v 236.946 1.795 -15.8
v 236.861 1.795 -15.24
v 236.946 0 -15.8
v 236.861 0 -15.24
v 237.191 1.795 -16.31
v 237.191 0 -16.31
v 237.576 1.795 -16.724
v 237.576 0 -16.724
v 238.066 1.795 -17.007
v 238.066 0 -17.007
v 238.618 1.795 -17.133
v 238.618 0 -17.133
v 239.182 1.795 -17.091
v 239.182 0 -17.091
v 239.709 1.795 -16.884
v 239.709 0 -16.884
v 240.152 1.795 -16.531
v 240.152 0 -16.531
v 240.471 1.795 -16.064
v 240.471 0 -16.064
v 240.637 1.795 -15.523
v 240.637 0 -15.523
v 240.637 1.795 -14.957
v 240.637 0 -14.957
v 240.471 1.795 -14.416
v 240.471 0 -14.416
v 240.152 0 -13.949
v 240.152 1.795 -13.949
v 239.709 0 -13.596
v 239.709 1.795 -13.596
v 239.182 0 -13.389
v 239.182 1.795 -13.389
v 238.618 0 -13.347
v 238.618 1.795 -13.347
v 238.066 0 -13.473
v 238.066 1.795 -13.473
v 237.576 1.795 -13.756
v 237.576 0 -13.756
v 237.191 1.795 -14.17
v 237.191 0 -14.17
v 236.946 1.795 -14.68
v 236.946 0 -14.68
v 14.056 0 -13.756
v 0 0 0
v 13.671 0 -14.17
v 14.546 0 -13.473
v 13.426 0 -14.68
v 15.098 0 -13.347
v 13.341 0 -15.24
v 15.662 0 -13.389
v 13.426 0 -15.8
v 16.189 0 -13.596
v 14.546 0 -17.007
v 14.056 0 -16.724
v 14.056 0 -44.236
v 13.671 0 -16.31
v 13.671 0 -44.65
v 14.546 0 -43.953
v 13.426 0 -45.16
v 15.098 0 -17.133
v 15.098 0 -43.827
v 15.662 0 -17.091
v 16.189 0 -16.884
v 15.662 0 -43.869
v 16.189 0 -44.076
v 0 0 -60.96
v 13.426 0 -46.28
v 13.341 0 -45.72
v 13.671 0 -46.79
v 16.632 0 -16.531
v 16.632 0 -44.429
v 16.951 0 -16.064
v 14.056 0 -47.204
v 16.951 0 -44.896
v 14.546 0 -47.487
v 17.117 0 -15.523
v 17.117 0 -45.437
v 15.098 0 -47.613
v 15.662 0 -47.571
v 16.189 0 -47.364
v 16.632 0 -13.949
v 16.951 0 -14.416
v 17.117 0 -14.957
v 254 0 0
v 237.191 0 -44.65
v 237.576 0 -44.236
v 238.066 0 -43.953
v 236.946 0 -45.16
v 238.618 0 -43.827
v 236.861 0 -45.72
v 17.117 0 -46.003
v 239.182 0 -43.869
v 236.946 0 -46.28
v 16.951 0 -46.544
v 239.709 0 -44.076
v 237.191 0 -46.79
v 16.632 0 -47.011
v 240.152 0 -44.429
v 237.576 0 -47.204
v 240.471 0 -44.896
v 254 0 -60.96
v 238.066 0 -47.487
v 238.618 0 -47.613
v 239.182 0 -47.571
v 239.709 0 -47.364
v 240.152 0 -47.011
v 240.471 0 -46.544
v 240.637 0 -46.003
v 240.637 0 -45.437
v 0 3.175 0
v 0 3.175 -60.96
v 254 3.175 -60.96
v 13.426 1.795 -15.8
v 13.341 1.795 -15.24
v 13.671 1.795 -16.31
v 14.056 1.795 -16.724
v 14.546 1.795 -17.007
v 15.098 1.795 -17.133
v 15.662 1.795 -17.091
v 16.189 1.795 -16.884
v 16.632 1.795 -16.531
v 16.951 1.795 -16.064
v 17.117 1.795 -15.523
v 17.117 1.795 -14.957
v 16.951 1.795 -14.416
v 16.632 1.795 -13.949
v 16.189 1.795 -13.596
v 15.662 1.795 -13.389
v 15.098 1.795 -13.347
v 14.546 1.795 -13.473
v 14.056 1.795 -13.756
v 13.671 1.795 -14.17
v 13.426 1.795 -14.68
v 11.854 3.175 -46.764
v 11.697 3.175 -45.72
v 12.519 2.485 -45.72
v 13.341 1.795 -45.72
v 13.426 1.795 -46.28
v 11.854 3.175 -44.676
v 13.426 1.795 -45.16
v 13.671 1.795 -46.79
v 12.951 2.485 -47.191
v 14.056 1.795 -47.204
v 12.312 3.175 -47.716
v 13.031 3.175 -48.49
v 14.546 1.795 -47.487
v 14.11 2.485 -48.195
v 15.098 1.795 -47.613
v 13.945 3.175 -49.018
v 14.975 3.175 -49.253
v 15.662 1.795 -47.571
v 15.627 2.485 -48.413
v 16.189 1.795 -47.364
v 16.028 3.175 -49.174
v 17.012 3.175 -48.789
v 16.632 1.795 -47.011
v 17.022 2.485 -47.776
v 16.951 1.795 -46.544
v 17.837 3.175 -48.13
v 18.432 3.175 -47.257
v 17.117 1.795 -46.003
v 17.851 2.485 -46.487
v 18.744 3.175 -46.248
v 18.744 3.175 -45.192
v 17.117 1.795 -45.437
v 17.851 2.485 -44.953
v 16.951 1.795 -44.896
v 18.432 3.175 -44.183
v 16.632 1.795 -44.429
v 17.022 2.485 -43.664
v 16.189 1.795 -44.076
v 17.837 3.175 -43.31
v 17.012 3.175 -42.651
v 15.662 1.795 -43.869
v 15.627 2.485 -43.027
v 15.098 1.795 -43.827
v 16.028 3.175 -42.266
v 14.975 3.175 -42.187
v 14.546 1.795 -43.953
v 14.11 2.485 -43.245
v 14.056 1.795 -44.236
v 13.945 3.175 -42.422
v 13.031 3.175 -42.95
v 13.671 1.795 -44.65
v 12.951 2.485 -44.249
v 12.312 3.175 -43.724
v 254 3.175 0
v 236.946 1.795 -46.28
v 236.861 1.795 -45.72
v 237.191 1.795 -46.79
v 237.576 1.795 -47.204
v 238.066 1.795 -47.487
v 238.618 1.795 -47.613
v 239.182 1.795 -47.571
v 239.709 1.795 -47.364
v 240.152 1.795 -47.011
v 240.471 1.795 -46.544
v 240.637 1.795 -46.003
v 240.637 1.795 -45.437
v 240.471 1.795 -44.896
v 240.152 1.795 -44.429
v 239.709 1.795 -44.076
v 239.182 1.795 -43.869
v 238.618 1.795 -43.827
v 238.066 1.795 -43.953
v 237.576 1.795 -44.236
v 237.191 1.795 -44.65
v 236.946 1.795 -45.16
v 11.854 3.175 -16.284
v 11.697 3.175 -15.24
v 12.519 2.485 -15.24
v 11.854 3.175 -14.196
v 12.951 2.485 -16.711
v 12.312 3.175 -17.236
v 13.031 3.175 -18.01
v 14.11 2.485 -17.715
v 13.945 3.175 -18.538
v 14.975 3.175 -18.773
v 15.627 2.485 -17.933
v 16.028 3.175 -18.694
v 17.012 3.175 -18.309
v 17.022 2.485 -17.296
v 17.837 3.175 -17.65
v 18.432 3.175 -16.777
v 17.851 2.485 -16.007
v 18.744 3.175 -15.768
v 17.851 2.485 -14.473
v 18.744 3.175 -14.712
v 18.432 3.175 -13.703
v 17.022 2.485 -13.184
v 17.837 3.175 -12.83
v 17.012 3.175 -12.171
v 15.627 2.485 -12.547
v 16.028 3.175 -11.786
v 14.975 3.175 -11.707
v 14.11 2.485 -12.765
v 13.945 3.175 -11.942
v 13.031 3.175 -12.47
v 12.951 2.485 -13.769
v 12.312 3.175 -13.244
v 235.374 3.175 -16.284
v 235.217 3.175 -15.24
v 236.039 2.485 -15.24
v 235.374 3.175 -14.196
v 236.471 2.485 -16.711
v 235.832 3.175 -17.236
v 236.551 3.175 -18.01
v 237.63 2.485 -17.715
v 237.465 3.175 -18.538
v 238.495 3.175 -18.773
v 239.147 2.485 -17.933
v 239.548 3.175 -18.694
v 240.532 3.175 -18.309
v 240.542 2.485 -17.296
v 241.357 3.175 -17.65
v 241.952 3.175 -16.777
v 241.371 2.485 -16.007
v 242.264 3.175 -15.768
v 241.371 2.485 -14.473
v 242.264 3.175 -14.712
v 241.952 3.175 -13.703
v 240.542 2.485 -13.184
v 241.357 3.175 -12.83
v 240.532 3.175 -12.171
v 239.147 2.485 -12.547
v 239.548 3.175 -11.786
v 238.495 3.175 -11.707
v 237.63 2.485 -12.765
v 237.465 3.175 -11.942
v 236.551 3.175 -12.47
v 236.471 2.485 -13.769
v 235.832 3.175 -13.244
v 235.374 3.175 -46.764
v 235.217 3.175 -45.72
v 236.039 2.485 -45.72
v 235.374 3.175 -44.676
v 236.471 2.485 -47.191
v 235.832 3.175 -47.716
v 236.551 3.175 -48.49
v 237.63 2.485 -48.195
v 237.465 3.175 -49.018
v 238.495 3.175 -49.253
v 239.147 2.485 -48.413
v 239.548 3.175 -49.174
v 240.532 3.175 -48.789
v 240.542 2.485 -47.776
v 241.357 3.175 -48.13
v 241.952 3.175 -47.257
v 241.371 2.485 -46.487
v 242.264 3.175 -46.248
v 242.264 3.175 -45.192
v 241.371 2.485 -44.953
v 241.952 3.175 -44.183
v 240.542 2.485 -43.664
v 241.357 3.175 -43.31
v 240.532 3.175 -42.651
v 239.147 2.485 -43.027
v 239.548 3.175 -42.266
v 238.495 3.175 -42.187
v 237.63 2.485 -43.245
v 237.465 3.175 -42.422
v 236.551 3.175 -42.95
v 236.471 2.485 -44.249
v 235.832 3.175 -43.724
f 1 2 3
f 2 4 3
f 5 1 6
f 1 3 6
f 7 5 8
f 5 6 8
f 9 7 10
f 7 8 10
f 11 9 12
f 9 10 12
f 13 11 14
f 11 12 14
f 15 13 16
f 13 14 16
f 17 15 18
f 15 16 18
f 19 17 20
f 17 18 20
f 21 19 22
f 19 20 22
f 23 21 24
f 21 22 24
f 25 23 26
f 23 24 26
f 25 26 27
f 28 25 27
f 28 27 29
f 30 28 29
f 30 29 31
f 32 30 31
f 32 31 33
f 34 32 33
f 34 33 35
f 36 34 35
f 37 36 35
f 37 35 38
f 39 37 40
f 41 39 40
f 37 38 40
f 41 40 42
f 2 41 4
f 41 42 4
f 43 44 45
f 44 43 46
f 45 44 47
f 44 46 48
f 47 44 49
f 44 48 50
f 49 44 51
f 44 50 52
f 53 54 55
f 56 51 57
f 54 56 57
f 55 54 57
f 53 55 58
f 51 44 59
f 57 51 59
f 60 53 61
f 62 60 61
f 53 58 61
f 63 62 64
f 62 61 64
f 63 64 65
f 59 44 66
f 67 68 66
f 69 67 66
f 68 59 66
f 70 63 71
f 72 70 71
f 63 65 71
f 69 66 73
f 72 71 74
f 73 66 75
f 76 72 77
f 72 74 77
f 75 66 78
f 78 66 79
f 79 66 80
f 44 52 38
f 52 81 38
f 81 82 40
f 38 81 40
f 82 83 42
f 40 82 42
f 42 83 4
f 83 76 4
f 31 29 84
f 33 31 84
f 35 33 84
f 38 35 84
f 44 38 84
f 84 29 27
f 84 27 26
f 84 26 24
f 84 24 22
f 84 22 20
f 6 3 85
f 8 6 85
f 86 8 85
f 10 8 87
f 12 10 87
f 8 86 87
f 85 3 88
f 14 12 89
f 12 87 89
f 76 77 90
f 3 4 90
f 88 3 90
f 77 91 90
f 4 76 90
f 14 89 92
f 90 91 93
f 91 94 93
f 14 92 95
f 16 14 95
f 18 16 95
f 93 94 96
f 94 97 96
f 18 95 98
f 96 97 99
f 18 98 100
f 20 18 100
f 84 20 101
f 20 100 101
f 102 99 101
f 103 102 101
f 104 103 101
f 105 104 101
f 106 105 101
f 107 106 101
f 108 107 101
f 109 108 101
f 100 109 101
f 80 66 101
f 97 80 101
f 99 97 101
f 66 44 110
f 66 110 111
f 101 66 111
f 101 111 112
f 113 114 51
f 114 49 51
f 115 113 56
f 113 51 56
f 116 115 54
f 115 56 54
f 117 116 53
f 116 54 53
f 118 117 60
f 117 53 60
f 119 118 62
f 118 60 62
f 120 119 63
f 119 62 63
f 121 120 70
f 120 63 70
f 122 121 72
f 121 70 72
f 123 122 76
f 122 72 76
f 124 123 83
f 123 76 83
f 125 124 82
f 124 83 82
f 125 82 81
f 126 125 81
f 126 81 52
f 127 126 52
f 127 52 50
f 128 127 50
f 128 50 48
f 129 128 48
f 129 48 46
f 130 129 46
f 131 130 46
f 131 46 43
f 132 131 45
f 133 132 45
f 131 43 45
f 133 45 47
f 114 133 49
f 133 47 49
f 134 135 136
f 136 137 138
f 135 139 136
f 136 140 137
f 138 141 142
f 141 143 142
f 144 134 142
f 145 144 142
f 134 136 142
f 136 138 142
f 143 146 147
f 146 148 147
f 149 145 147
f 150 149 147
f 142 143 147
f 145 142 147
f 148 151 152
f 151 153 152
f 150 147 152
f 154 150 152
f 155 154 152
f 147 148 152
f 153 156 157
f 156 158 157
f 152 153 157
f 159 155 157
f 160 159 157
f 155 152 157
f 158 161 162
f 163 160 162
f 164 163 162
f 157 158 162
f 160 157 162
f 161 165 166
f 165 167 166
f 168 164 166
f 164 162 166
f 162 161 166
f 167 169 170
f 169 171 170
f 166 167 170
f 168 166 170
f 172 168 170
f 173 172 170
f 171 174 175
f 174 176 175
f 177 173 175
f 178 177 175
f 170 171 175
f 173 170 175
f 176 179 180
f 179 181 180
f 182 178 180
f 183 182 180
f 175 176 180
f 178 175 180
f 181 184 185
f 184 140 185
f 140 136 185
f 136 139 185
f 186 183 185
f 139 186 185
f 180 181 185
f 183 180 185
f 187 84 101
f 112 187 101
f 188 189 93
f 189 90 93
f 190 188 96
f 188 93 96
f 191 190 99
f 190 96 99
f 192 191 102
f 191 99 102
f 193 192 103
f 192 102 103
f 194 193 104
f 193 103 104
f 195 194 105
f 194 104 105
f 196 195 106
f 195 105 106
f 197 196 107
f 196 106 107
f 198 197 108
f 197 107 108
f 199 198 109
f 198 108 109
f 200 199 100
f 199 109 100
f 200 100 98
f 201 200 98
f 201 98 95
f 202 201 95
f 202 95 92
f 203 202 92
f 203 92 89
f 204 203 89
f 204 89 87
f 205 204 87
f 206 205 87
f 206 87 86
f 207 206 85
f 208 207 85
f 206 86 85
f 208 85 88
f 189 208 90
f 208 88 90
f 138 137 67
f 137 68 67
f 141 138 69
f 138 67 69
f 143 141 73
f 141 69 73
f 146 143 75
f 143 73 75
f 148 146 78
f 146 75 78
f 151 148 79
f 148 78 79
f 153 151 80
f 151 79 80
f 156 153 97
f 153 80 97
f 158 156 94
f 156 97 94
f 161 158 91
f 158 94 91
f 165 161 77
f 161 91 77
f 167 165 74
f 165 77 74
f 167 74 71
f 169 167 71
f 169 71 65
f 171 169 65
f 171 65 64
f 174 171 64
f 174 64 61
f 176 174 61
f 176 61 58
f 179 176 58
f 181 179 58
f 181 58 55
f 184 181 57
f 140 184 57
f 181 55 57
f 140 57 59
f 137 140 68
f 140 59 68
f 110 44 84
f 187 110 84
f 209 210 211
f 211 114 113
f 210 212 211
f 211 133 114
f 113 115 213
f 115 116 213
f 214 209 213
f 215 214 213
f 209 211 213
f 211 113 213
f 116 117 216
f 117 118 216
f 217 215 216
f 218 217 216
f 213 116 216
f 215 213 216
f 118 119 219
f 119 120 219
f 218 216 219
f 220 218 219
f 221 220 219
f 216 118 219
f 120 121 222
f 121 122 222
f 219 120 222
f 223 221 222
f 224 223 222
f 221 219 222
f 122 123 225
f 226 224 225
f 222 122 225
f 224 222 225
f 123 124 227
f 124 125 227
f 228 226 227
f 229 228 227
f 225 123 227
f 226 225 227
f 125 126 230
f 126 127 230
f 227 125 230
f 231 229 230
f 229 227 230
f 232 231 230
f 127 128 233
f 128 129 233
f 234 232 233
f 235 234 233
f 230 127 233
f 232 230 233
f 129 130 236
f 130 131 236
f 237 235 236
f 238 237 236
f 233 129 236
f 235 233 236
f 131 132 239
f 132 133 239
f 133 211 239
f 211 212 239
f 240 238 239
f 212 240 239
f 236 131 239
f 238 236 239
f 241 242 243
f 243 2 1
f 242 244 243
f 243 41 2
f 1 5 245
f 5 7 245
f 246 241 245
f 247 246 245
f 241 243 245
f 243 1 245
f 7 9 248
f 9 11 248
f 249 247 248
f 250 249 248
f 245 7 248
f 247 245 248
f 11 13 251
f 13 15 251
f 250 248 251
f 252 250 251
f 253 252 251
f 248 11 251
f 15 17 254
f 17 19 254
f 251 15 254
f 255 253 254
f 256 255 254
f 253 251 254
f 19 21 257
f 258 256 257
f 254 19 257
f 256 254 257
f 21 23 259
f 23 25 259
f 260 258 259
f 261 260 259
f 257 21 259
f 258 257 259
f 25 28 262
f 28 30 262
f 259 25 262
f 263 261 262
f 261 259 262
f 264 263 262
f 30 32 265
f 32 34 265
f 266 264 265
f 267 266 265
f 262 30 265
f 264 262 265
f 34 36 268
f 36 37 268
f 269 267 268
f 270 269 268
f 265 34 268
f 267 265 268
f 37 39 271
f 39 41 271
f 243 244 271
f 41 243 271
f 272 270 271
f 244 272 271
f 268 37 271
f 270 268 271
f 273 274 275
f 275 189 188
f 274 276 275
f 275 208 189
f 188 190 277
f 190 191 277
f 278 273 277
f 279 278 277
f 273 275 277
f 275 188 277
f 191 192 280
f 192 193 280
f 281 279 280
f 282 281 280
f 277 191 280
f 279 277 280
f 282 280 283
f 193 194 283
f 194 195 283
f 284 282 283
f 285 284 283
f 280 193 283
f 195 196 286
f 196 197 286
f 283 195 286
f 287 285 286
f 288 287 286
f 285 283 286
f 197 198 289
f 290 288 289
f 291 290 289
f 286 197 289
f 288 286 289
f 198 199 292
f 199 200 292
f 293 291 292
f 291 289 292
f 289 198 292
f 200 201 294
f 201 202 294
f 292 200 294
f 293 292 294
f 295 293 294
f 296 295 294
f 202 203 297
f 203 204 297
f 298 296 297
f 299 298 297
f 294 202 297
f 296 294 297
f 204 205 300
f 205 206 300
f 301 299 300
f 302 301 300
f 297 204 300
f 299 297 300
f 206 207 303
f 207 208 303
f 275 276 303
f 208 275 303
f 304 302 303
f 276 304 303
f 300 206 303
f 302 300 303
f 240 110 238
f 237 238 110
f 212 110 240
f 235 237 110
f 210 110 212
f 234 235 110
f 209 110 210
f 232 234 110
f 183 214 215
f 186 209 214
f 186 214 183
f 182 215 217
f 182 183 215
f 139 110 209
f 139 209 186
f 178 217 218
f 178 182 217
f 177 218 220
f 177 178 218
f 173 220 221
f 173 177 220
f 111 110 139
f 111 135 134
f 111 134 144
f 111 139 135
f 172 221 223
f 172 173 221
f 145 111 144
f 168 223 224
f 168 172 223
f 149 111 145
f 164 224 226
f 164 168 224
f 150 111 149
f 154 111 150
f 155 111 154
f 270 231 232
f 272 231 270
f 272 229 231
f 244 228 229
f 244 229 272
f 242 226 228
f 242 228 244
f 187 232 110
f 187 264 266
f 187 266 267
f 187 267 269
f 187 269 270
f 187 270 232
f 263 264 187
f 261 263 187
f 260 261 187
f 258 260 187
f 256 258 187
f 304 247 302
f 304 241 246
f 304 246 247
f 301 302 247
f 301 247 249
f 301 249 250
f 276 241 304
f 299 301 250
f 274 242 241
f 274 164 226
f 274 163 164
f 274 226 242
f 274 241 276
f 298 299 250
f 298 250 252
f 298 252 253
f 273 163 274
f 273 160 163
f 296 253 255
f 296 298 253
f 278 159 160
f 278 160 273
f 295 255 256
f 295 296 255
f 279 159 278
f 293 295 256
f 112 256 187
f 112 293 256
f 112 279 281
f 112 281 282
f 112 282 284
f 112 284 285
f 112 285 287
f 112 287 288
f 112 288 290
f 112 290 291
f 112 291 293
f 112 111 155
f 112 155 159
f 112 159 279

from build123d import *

# Parameters (mm, degrees)
SKETCH2_W                                         = 254
SKETCH2_H                                         = 60.96
BOSS_EXTRUDE1_DEPTH                               = 3.175
CSK_FOR_6_FLAT_HEAD_MACHINE_SCREW_100_D           = 3.7973
CSK_FOR_6_FLAT_HEAD_MACHINE_SCREW_100_DEPTH       = 3.175
CSK_FOR_6_FLAT_HEAD_MACHINE_SCREW_100_CSINK_D     = 7.0866
CSK_FOR_6_FLAT_HEAD_MACHINE_SCREW_100_CSINK_ANGLE = 100
CSK_FOR_6_FLAT_HEAD_MACHINE_SCREW_100_TIP         = 1.140824014


with BuildPart() as part:
    # Sketch2 → Boss-Extrude1 (new body)
    with BuildSketch(Plane(origin=(0, 0, 0), x_dir=(1, 0, 0), z_dir=(0, 1, 0))):
        with Locations((127, 30.48)):
            Rectangle(SKETCH2_W, SKETCH2_H)
    extrude(amount=BOSS_EXTRUDE1_DEPTH)

    # CSK for #6 Flat Head Machine Screw (100)1
    with Locations(Plane(origin=(0, 3.175, 0), x_dir=(1, 0, 0), z_dir=(0, 1, 0))):
        with Locations((15.24, 15.24), (15.24, 45.72), (238.76, 15.24), (238.76, 45.72)):
            CounterSinkHole(CSK_FOR_6_FLAT_HEAD_MACHINE_SCREW_100_D / 2, CSK_FOR_6_FLAT_HEAD_MACHINE_SCREW_100_CSINK_D / 2, depth=CSK_FOR_6_FLAT_HEAD_MACHINE_SCREW_100_DEPTH, counter_sink_angle=CSK_FOR_6_FLAT_HEAD_MACHINE_SCREW_100_CSINK_ANGLE)
            with Locations((0, 0, -(CSK_FOR_6_FLAT_HEAD_MACHINE_SCREW_100_DEPTH + CSK_FOR_6_FLAT_HEAD_MACHINE_SCREW_100_TIP / 2))):  # 118° drill point
                Cone(0, CSK_FOR_6_FLAT_HEAD_MACHINE_SCREW_100_D / 2, CSK_FOR_6_FLAT_HEAD_MACHINE_SCREW_100_TIP, mode=Mode.SUBTRACT)


solid = part.part
